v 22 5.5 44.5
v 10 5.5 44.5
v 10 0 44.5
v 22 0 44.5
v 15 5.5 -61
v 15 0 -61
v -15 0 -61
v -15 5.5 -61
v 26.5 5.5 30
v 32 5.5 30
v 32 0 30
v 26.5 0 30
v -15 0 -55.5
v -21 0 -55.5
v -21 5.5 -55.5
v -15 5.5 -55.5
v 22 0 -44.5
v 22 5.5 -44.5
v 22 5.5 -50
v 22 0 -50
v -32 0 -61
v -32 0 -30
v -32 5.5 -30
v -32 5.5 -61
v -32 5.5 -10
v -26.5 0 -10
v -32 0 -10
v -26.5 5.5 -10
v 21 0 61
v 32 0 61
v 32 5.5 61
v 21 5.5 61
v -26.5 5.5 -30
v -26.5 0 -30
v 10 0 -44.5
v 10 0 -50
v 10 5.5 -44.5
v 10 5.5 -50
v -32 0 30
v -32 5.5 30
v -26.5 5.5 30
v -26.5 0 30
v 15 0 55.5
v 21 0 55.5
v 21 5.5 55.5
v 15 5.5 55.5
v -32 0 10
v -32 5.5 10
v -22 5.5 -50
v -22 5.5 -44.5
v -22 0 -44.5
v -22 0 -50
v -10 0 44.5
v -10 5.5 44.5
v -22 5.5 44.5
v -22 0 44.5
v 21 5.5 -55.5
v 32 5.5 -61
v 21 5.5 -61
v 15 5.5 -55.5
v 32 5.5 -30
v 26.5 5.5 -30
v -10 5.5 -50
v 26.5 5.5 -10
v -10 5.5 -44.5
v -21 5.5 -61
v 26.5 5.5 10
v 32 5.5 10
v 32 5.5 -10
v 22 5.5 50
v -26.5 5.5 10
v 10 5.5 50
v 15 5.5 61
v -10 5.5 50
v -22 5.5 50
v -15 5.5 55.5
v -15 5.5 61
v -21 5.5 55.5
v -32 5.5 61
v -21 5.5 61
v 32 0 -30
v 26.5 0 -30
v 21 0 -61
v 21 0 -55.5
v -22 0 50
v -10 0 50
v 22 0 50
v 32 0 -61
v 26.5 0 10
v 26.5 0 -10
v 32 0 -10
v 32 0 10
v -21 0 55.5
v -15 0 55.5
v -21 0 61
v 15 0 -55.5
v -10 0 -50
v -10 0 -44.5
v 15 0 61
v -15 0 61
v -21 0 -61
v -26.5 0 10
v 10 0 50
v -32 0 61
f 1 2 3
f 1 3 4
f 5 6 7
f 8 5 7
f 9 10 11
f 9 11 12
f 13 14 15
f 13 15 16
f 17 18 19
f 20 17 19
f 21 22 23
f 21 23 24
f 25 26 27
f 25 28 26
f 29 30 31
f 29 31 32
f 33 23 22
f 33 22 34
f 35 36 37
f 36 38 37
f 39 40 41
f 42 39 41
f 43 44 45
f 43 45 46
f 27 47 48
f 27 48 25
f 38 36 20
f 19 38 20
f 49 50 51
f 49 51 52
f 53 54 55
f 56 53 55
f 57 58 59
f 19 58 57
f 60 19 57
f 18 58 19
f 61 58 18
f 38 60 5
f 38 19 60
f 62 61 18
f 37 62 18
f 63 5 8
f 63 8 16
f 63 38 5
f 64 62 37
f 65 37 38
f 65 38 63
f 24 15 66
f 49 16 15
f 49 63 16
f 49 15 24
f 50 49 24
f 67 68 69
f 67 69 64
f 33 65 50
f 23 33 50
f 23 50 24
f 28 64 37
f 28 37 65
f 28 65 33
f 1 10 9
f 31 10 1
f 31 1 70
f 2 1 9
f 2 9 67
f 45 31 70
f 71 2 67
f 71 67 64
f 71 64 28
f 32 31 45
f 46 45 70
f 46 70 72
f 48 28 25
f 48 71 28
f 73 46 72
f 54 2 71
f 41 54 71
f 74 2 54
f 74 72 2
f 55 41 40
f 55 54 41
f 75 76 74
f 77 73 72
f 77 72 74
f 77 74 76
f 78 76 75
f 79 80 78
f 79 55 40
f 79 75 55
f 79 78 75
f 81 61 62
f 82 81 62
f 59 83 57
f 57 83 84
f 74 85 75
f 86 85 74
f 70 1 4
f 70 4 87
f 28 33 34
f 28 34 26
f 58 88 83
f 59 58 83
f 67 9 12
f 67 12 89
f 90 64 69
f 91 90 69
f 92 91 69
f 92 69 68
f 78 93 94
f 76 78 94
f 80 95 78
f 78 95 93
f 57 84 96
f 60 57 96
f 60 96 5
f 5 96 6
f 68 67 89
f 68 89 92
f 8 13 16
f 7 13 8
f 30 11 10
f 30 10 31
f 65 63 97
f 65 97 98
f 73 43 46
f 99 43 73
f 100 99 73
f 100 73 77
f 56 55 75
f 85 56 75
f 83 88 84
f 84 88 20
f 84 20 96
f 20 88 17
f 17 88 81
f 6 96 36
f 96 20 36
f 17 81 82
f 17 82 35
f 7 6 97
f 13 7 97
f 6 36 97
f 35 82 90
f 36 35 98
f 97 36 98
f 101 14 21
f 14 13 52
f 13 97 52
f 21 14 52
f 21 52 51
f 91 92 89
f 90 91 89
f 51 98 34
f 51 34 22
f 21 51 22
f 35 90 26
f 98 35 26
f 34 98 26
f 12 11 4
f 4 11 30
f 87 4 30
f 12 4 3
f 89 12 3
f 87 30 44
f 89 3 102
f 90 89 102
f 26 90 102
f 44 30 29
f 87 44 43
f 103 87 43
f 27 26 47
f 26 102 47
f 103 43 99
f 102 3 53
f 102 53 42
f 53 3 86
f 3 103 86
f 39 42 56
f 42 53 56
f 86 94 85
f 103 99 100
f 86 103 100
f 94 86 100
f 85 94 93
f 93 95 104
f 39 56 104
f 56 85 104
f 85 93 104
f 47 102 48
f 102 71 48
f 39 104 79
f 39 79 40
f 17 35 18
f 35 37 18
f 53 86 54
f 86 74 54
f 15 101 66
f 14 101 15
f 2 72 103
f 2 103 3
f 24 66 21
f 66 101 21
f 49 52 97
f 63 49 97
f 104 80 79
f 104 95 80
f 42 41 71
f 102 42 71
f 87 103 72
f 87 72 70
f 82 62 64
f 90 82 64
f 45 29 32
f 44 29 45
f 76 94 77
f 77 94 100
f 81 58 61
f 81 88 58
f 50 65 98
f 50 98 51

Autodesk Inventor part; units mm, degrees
ref_plane "YZ Plane" through (0, 0, 0) normal (1, 0, 0) x (0, 1, 0)
ref_plane "XZ Plane" through (0, 0, 0) normal (0, 1, 0) x (-1, 0, 0)
ref_plane "XY Plane" through (0, 0, 0) normal (0, 0, 1) x (1, 0, 0)
sketch "Block1" plane through (0, 0, 0) normal (0, 0, 1) x (1, 0, 0)
  line L0 (-15.1, 61.1) -> (15.1, 61.1)
  line L1 (15.1, 61.1) -> (15.1, 52.1)
  line L2 (15.1, 52.1) -> (20.9, 52.1)
  line L3 (20.9, 52.1) -> (20.9, 61.1)
  line L4 (20.9, 61.1) -> (35.6, 61.1)
  line L5 (35.6, 61.1) -> (35.6, 29.9)
  line L6 (35.6, 29.9) -> (26.6, 29.9)
  line L7 (26.6, 29.9) -> (26.6, 10.1)
  line L8 (26.6, 10.1) -> (35.6, 10.1)
  line L9 (35.6, 10.1) -> (35.6, -10.1)
  line L10 (35.6, -10.1) -> (26.6, -10.1)
  line L11 (26.6, -10.1) -> (26.6, -29.9)
  line L12 (26.6, -29.9) -> (35.6, -29.9)
  line L13 (35.6, -29.9) -> (35.6, -61.1)
  line L14 (35.6, -61.1) -> (20.9, -61.1)
  line L15 (20.9, -61.1) -> (20.9, -52.1)
  line L16 (20.9, -52.1) -> (15.1, -52.1)
  line L17 (15.1, -52.1) -> (15.1, -61.1)
  line L18 (15.1, -61.1) -> (-15.1, -61.1)
  line L19 (-15.1, -61.1) -> (-15.1, -52.1)
  line L20 (-15.1, -52.1) -> (-20.9, -52.1)
  line L21 (-20.9, -52.1) -> (-20.9, -61.1)
  line L22 (-20.9, -61.1) -> (-35.6, -61.1)
  line L23 (-35.6, -61.1) -> (-35.6, -29.9)
  line L24 (-35.6, -29.9) -> (-26.6, -29.9)
  line L25 (-26.6, -29.9) -> (-26.6, -10.1)
  line L26 (-26.6, -10.1) -> (-35.6, -10.1)
  line L27 (-35.6, -10.1) -> (-35.6, 10.1)
  line L28 (-35.6, 10.1) -> (-26.6, 10.1)
  line L29 (-26.6, 10.1) -> (-26.6, 29.9)
  line L30 (-26.6, 29.9) -> (-35.6, 29.9)
  line L31 (-35.6, 29.9) -> (-35.6, 61.1)
  line L32 (-35.6, 61.1) -> (-20.9, 61.1)
  line L33 (-20.9, 61.1) -> (-20.9, 52.1)
  line L34 (-20.9, 52.1) -> (-15.1, 52.1)
  line L35 (-15.1, 52.1) -> (-15.1, 61.1)
  line L36 (-9.9, 50.1) -> (-22.1, 50.1)
  line L37 (-22.1, 50.1) -> (-22.1, 40.9)
  line L38 (-22.1, 40.9) -> (-9.9, 40.9)
  line L39 (-9.9, 40.9) -> (-9.9, 50.1)
  line L40 (22.1, 50.1) -> (22.1, 40.9)
  line L41 (22.1, 40.9) -> (9.9, 40.9)
  line L42 (9.9, 40.9) -> (9.9, 50.1)
  line L43 (9.9, 50.1) -> (22.1, 50.1)
  line L44 (22.1, -40.9) -> (9.9, -40.9)
  line L45 (9.9, -40.9) -> (9.9, -50.1)
  line L46 (9.9, -50.1) -> (22.1, -50.1)
  line L47 (22.1, -50.1) -> (22.1, -40.9)
  line L48 (-9.9, -40.9) -> (-22.1, -40.9)
  line L49 (-22.1, -40.9) -> (-22.1, -50.1)
  line L50 (-22.1, -50.1) -> (-9.9, -50.1)
  line L51 (-9.9, -50.1) -> (-9.9, -40.9)
  point P0 (0, 0)
sketch "Block2" plane through (0, 0, 0) normal (0, 0, 1) x (1, 0, 0)
  line L0 (20.8, 61.2) -> (35.7, 61.2)
  line L1 (35.7, 61.2) -> (35.7, 29.8)
  line L2 (35.7, 29.8) -> (26.7, 29.8)
  line L3 (26.7, 29.8) -> (26.7, 10.2)
  line L4 (26.7, 10.2) -> (35.7, 10.2)
  line L5 (35.7, 10.2) -> (35.7, -10.2)
  line L6 (35.7, -10.2) -> (26.7, -10.2)
  line L7 (26.7, -10.2) -> (26.7, -29.8)
  line L8 (26.7, -29.8) -> (35.7, -29.8)
  line L9 (35.7, -29.8) -> (35.7, -61.2)
  line L10 (35.7, -61.2) -> (20.8, -61.2)
  line L11 (20.8, -61.2) -> (20.8, -52.2)
  line L12 (20.8, -52.2) -> (15.2, -52.2)
  line L13 (15.2, -52.2) -> (15.2, -61.2)
  line L14 (15.2, -61.2) -> (-15.2, -61.2)
  line L15 (-15.2, -61.2) -> (-15.2, -52.2)
  line L16 (-15.2, -52.2) -> (-20.8, -52.2)
  line L17 (-20.8, -52.2) -> (-20.8, -61.2)
  line L18 (-20.8, -61.2) -> (-35.7, -61.2)
  line L19 (-35.7, -61.2) -> (-35.7, -29.8)
  line L20 (-35.7, -29.8) -> (-26.7, -29.8)
  line L21 (-26.7, -29.8) -> (-26.7, -10.2)
  line L22 (-26.7, -10.2) -> (-35.7, -10.2)
  line L23 (-35.7, -10.2) -> (-35.7, 10.2)
  line L24 (-35.7, 10.2) -> (-26.7, 10.2)
  line L25 (-26.7, 10.2) -> (-26.7, 29.8)
  line L26 (-26.7, 29.8) -> (-35.7, 29.8)
  line L27 (-35.7, 29.8) -> (-35.7, 61.2)
  line L28 (-35.7, 61.2) -> (-20.8, 61.2)
  line L29 (-20.8, 61.2) -> (-20.8, 52.2)
  line L30 (-20.8, 52.2) -> (-15.2, 52.2)
  line L31 (-15.2, 52.2) -> (-15.2, 61.2)
  line L32 (-15.2, 61.2) -> (15.2, 61.2)
  line L33 (15.2, 61.2) -> (15.2, 52.2)
  line L34 (15.2, 52.2) -> (20.8, 52.2)
  line L35 (20.8, 52.2) -> (20.8, 61.2)
  line L36 (22.2, 50.2) -> (22.2, 40.8)
  line L37 (22.2, 40.8) -> (9.8, 40.8)
  line L38 (9.8, 40.8) -> (9.8, 50.2)
  line L39 (9.8, 50.2) -> (22.2, 50.2)
  line L40 (-9.8, 50.2) -> (-22.2, 50.2)
  line L41 (-22.2, 50.2) -> (-22.2, 40.8)
  line L42 (-22.2, 40.8) -> (-9.8, 40.8)
  line L43 (-9.8, 40.8) -> (-9.8, 50.2)
  line L44 (-9.8, -40.8) -> (-22.2, -40.8)
  line L45 (-22.2, -40.8) -> (-22.2, -50.2)
  line L46 (-22.2, -50.2) -> (-9.8, -50.2)
  line L47 (-9.8, -50.2) -> (-9.8, -40.8)
  line L48 (22.2, -40.8) -> (9.8, -40.8)
  line L49 (9.8, -40.8) -> (9.8, -50.2)
  line L50 (9.8, -50.2) -> (22.2, -50.2)
  line L51 (22.2, -50.2) -> (22.2, -40.8)
  point P0 (0, 0)
sketch "Block3" plane through (0, 0, 0) normal (0, 0, 1) x (1, 0, 0)
  line L0 (20.9, 61.1) -> (35.6, 61.1)
  line L1 (35.6, 61.1) -> (35.6, 29.9)
  line L2 (35.6, 29.9) -> (26.6, 29.9)
  line L3 (26.6, 29.9) -> (26.6, 10.1)
  line L4 (26.6, 10.1) -> (35.6, 10.1)
  line L5 (35.6, 10.1) -> (35.6, -10.1)
  line L6 (35.6, -10.1) -> (26.6, -10.1)
  line L7 (26.6, -10.1) -> (26.6, -29.9)
  line L8 (26.6, -29.9) -> (35.6, -29.9)
  line L9 (35.6, -29.9) -> (35.6, -61.1)
  line L10 (35.6, -61.1) -> (20.9, -61.1)
  line L11 (20.9, -61.1) -> (20.9, -52.1)
  line L12 (20.9, -52.1) -> (15.1, -52.1)
  line L13 (15.1, -52.1) -> (15.1, -61.1)
  line L14 (15.1, -61.1) -> (-15.1, -61.1)
  line L15 (-15.1, -61.1) -> (-15.1, -52.1)
  line L16 (-15.1, -52.1) -> (-20.9, -52.1)
  line L17 (-20.9, -52.1) -> (-20.9, -61.1)
  line L18 (-20.9, -61.1) -> (-35.6, -61.1)
  line L19 (-35.6, -61.1) -> (-35.6, -29.9)
  line L20 (-35.6, -29.9) -> (-26.6, -29.9)
  line L21 (-26.6, -29.9) -> (-26.6, -10.1)
  line L22 (-26.6, -10.1) -> (-35.6, -10.1)
  line L23 (-35.6, -10.1) -> (-35.6, 10.1)
  line L24 (-35.6, 10.1) -> (-26.6, 10.1)
  line L25 (-26.6, 10.1) -> (-26.6, 29.9)
  line L26 (-26.6, 29.9) -> (-35.6, 29.9)
  line L27 (-35.6, 29.9) -> (-35.6, 61.1)
  line L28 (-35.6, 61.1) -> (-20.9, 61.1)
  line L29 (-20.9, 61.1) -> (-20.9, 52.1)
  line L30 (-20.9, 52.1) -> (-15.1, 52.1)
  line L31 (-15.1, 52.1) -> (-15.1, 61.1)
  line L32 (-15.1, 61.1) -> (15.1, 61.1)
  line L33 (15.1, 61.1) -> (15.1, 52.1)
  line L34 (15.1, 52.1) -> (20.9, 52.1)
  line L35 (20.9, 52.1) -> (20.9, 61.1)
  line L36 (22.1, 50.1) -> (22.1, 40.9)
  line L37 (22.1, 40.9) -> (9.9, 40.9)
  line L38 (9.9, 40.9) -> (9.9, 50.1)
  line L39 (9.9, 50.1) -> (22.1, 50.1)
  line L40 (-9.9, 50.1) -> (-22.1, 50.1)
  line L41 (-22.1, 50.1) -> (-22.1, 40.9)
  line L42 (-22.1, 40.9) -> (-9.9, 40.9)
  line L43 (-9.9, 40.9) -> (-9.9, 50.1)
  line L44 (-9.9, -40.9) -> (-22.1, -40.9)
  line L45 (-22.1, -40.9) -> (-22.1, -50.1)
  line L46 (-22.1, -50.1) -> (-9.9, -50.1)
  line L47 (-9.9, -50.1) -> (-9.9, -40.9)
  line L48 (22.1, -40.9) -> (9.9, -40.9)
  line L49 (9.9, -40.9) -> (9.9, -50.1)
  line L50 (9.9, -50.1) -> (22.1, -50.1)
  line L51 (22.1, -50.1) -> (22.1, -40.9)
  point P0 (0, 0)
sketch "Block4" plane through (0, 0, 0) normal (0, 0, 1) x (1, 0, 0)
  line L0 (-15.08, 61.08) -> (15.08, 61.08)
  line L1 (15.08, 61.08) -> (15.08, 55.58)
  line L2 (15.08, 55.58) -> (20.92, 55.58)
  line L3 (20.92, 55.58) -> (20.92, 61.08)
  line L4 (20.92, 61.08) -> (32.08, 61.08)
  line L5 (32.08, 61.08) -> (32.08, 29.92)
  line L6 (32.08, 29.92) -> (26.58, 29.92)
  line L7 (26.58, 29.92) -> (26.58, 10.08)
  line L8 (26.58, 10.08) -> (32.08, 10.08)
  line L9 (32.08, 10.08) -> (32.08, -10.08)
  line L10 (32.08, -10.08) -> (26.58, -10.08)
  line L11 (26.58, -10.08) -> (26.58, -29.92)
  line L12 (26.58, -29.92) -> (32.08, -29.92)
  line L13 (32.08, -29.92) -> (32.08, -61.08)
  line L14 (32.08, -61.08) -> (20.92, -61.08)
  line L15 (20.92, -61.08) -> (20.92, -55.58)
  line L16 (20.92, -55.58) -> (15.08, -55.58)
  line L17 (15.08, -55.58) -> (15.08, -61.08)
  line L18 (15.08, -61.08) -> (-15.08, -61.08)
  line L19 (-15.08, -61.08) -> (-15.08, -55.58)
  line L20 (-15.08, -55.58) -> (-20.92, -55.58)
  line L21 (-20.92, -55.58) -> (-20.92, -61.08)
  line L22 (-20.92, -61.08) -> (-32.08, -61.08)
  line L23 (-32.08, -61.08) -> (-32.08, -29.92)
  line L24 (-32.08, -29.92) -> (-26.58, -29.92)
  line L25 (-26.58, -29.92) -> (-26.58, -10.08)
  line L26 (-26.58, -10.08) -> (-32.08, -10.08)
  line L27 (-32.08, -10.08) -> (-32.08, 10.08)
  line L28 (-32.08, 10.08) -> (-26.58, 10.08)
  line L29 (-26.58, 10.08) -> (-26.58, 29.92)
  line L30 (-26.58, 29.92) -> (-32.08, 29.92)
  line L31 (-32.08, 29.92) -> (-32.08, 61.08)
  line L32 (-32.08, 61.08) -> (-20.92, 61.08)
  line L33 (-20.92, 61.08) -> (-20.92, 55.58)
  line L34 (-20.92, 55.58) -> (-15.08, 55.58)
  line L35 (-15.08, 55.58) -> (-15.08, 61.08)
  line L36 (-9.92, 50.08) -> (-22.08, 50.08)
  line L37 (-22.08, 50.08) -> (-22.08, 44.42)
  line L38 (-22.08, 44.42) -> (-9.92, 44.42)
  line L39 (-9.92, 44.42) -> (-9.92, 50.08)
  line L40 (22.08, 50.08) -> (22.08, 44.42)
  line L41 (22.08, 44.42) -> (9.92, 44.42)
  line L42 (9.92, 44.42) -> (9.92, 50.08)
  line L43 (9.92, 50.08) -> (22.08, 50.08)
  line L44 (-9.92, -44.42) -> (-22.08, -44.42)
  line L45 (-22.08, -44.42) -> (-22.08, -50.08)
  line L46 (-22.08, -50.08) -> (-9.92, -50.08)
  line L47 (-9.92, -50.08) -> (-9.92, -44.42)
  line L48 (22.08, -44.42) -> (9.92, -44.42)
  line L49 (9.92, -44.42) -> (9.92, -50.08)
  line L50 (9.92, -50.08) -> (22.08, -50.08)
  line L51 (22.08, -50.08) -> (22.08, -44.42)
  point P0 (0, 0)
sketch "Sketch1" plane through (0, 0, 0) normal (0, 1, 0) x (-1, 0, 0)
  line L0 (32, -50) -> (-32, -50)
  line L1 (-32, -50) -> (-32, 50)
  line L2 (-32, 50) -> (32, 50)
  line L3 (32, 50) -> (32, -50)
  line L4 (32, -50) -> (-32, 50) construction
  line L5 (-32, -50) -> (32, 50) construction
  point P0 (0, 0)
  dimension "d0" = 64
  dimension "d1" = 100
extrude "Extrusion1" add sketch "Sketch1" along normal blind 5.5
sketch "Sketch5" plane through (0, 5.5, 0) normal (0, 1, 0) x (1, 0, 0)
  line L0 (32, 50) -> (-32, 50) projected
  line L1 (-32, 50) -> (-32, -50) projected
  line L2 (-32, 30) -> (-26.5, 30)
  line L3 (-26.5, 30) -> (-26.5, 10)
  line L4 (-26.5, 10) -> (-32, 10)
  line L5 (-32, 10) -> (-32, 30)
  line L6 (-66.327, 0) -> (148.7623, 0) projected
  line L7 (0, 85.6282) -> (0, -86.069) projected
  line L8 (-32, -30) -> (-26.5, -30)
  line L9 (-26.5, -30) -> (-26.5, -10)
  line L10 (-26.5, -10) -> (-32, -10)
  line L11 (-32, -10) -> (-32, -30)
  line L12 (32, 30) -> (26.5, 30)
  line L13 (26.5, 30) -> (26.5, 10)
  line L14 (26.5, 10) -> (32, 10)
  line L15 (32, 10) -> (32, 30)
  line L16 (32, -30) -> (26.5, -30)
  line L17 (26.5, -30) -> (26.5, -10)
  line L18 (26.5, -10) -> (32, -10)
  line L19 (32, -10) -> (32, -30)
  point P0 (0, 0)
  dimension "d12" = 20
  dimension "d13" = 20
  dimension "d14" = 5.5
extrude "Extrusion3" cut sketch "Sketch5" against normal through all contours L10 L9 L8 L1 | L2 L3 L4 L1 | L15 L14 L13 L12 | L16 L17 L18 L19
sketch "Sketch6" plane through (0, 5.5, 0) normal (0, 1, 0) x (1, 0, 0)
  line L0 (32, 50) -> (-32, 50) projected
  line L1 (-66.327, 0) -> (148.7623, 0) projected
  line L2 (0, 85.6282) -> (0, -86.069) projected
  line L3 (-22, 50) -> (-10, 50)
  line L4 (-10, 50) -> (-10, 44.5)
  line L5 (-10, 44.5) -> (-22, 44.5)
  line L6 (-22, 44.5) -> (-22, 50)
  line L7 (22, 50) -> (10, 50)
  line L8 (10, 50) -> (10, 44.5)
  line L9 (10, 44.5) -> (22, 44.5)
  line L10 (22, 44.5) -> (22, 50)
  line L11 (-22, -50) -> (-10, -50)
  line L12 (-10, -50) -> (-10, -44.5)
  line L13 (-10, -44.5) -> (-22, -44.5)
  line L14 (-22, -44.5) -> (-22, -50)
  line L15 (10, -44.5) -> (22, -44.5)
  line L16 (22, -50) -> (10, -50)
  line L17 (10, -50) -> (10, -44.5)
  line L18 (22, -44.5) -> (22, -50)
  point P0 (0, 0)
  dimension "d17" = 5.5
  dimension "d18" = 12
  dimension "d19" = 20
extrude "Extrusion4" cut sketch "Sketch6" against normal through all
sketch "Sketch7" plane through (0, 0, 0) normal (0, -1, 0) x (1, 0, 0)
  line L0 (-32, -50) -> (32, -50)
  line L1 (32, -50) -> (32, -61)
  line L2 (32, -61) -> (-32, -61)
  line L3 (-32, -61) -> (-32, -50)
  line L4 (-66.327, 0) -> (148.7623, 0) projected
  line L5 (0, -85.6282) -> (0, 86.069) projected
  line L6 (-15, -61) -> (-21, -61)
  line L7 (-21, -61) -> (-21, -55.5)
  line L8 (-21, -55.5) -> (-15, -55.5)
  line L9 (-15, -55.5) -> (-15, -61)
  line L10 (15, -61) -> (21, -61)
  line L11 (21, -61) -> (21, -55.5)
  line L12 (21, -55.5) -> (15, -55.5)
  line L13 (15, -55.5) -> (15, -61)
  line L14 (-32, 50) -> (32, 50)
  line L15 (32, 50) -> (32, 61)
  line L16 (32, 61) -> (-32, 61)
  line L17 (-32, 61) -> (-32, 50)
  line L18 (-32, 50) -> (-22, 50)
  line L19 (-10, 50) -> (10, 50)
  line L20 (22, 50) -> (32, 50)
  line L21 (-15, 61) -> (-21, 61)
  line L22 (-21, 61) -> (-21, 55.5)
  line L23 (-21, 55.5) -> (-15, 55.5)
  line L24 (-15, 55.5) -> (-15, 61)
  line L25 (21, 55.5) -> (15, 55.5)
  line L26 (15, 55.5) -> (15, 61)
  line L27 (15, 61) -> (21, 61)
  line L28 (21, 61) -> (21, 55.5)
  point P0 (0, 0)
  point P1 (32, -50)
  dimension "d22" = 11
  dimension "d23" = 6
  dimension "d24" = 5.5
  dimension "d32" = 15
  dimension "d55" = 64
extrude "Extrusion7" add sketch "Sketch7" against normal blind 5.5 contours L14 L17 L16 L22 L23 L24 L5 | L5 L16 L26 L25 L28 L15 L14 | L0 L5 L2 L9 L8 L7 L3 | L0 L1 L2 L11 L12 L13 L5
equation "\"d2\" = Wt"
equation "\"d14\" = Wt"
equation "\"d15\" = Wt"
equation "\"d17\" = Wt"
equation "\"d20\" = Wt"
equation "\"d24\" = Wt"
equation "\"d55\" = d0"
equation "\"d33\" = Wt"
equation "\"Wt\" = 5.5"
properties part number "holder_ceil_plate" material "Wood (Birch)"
